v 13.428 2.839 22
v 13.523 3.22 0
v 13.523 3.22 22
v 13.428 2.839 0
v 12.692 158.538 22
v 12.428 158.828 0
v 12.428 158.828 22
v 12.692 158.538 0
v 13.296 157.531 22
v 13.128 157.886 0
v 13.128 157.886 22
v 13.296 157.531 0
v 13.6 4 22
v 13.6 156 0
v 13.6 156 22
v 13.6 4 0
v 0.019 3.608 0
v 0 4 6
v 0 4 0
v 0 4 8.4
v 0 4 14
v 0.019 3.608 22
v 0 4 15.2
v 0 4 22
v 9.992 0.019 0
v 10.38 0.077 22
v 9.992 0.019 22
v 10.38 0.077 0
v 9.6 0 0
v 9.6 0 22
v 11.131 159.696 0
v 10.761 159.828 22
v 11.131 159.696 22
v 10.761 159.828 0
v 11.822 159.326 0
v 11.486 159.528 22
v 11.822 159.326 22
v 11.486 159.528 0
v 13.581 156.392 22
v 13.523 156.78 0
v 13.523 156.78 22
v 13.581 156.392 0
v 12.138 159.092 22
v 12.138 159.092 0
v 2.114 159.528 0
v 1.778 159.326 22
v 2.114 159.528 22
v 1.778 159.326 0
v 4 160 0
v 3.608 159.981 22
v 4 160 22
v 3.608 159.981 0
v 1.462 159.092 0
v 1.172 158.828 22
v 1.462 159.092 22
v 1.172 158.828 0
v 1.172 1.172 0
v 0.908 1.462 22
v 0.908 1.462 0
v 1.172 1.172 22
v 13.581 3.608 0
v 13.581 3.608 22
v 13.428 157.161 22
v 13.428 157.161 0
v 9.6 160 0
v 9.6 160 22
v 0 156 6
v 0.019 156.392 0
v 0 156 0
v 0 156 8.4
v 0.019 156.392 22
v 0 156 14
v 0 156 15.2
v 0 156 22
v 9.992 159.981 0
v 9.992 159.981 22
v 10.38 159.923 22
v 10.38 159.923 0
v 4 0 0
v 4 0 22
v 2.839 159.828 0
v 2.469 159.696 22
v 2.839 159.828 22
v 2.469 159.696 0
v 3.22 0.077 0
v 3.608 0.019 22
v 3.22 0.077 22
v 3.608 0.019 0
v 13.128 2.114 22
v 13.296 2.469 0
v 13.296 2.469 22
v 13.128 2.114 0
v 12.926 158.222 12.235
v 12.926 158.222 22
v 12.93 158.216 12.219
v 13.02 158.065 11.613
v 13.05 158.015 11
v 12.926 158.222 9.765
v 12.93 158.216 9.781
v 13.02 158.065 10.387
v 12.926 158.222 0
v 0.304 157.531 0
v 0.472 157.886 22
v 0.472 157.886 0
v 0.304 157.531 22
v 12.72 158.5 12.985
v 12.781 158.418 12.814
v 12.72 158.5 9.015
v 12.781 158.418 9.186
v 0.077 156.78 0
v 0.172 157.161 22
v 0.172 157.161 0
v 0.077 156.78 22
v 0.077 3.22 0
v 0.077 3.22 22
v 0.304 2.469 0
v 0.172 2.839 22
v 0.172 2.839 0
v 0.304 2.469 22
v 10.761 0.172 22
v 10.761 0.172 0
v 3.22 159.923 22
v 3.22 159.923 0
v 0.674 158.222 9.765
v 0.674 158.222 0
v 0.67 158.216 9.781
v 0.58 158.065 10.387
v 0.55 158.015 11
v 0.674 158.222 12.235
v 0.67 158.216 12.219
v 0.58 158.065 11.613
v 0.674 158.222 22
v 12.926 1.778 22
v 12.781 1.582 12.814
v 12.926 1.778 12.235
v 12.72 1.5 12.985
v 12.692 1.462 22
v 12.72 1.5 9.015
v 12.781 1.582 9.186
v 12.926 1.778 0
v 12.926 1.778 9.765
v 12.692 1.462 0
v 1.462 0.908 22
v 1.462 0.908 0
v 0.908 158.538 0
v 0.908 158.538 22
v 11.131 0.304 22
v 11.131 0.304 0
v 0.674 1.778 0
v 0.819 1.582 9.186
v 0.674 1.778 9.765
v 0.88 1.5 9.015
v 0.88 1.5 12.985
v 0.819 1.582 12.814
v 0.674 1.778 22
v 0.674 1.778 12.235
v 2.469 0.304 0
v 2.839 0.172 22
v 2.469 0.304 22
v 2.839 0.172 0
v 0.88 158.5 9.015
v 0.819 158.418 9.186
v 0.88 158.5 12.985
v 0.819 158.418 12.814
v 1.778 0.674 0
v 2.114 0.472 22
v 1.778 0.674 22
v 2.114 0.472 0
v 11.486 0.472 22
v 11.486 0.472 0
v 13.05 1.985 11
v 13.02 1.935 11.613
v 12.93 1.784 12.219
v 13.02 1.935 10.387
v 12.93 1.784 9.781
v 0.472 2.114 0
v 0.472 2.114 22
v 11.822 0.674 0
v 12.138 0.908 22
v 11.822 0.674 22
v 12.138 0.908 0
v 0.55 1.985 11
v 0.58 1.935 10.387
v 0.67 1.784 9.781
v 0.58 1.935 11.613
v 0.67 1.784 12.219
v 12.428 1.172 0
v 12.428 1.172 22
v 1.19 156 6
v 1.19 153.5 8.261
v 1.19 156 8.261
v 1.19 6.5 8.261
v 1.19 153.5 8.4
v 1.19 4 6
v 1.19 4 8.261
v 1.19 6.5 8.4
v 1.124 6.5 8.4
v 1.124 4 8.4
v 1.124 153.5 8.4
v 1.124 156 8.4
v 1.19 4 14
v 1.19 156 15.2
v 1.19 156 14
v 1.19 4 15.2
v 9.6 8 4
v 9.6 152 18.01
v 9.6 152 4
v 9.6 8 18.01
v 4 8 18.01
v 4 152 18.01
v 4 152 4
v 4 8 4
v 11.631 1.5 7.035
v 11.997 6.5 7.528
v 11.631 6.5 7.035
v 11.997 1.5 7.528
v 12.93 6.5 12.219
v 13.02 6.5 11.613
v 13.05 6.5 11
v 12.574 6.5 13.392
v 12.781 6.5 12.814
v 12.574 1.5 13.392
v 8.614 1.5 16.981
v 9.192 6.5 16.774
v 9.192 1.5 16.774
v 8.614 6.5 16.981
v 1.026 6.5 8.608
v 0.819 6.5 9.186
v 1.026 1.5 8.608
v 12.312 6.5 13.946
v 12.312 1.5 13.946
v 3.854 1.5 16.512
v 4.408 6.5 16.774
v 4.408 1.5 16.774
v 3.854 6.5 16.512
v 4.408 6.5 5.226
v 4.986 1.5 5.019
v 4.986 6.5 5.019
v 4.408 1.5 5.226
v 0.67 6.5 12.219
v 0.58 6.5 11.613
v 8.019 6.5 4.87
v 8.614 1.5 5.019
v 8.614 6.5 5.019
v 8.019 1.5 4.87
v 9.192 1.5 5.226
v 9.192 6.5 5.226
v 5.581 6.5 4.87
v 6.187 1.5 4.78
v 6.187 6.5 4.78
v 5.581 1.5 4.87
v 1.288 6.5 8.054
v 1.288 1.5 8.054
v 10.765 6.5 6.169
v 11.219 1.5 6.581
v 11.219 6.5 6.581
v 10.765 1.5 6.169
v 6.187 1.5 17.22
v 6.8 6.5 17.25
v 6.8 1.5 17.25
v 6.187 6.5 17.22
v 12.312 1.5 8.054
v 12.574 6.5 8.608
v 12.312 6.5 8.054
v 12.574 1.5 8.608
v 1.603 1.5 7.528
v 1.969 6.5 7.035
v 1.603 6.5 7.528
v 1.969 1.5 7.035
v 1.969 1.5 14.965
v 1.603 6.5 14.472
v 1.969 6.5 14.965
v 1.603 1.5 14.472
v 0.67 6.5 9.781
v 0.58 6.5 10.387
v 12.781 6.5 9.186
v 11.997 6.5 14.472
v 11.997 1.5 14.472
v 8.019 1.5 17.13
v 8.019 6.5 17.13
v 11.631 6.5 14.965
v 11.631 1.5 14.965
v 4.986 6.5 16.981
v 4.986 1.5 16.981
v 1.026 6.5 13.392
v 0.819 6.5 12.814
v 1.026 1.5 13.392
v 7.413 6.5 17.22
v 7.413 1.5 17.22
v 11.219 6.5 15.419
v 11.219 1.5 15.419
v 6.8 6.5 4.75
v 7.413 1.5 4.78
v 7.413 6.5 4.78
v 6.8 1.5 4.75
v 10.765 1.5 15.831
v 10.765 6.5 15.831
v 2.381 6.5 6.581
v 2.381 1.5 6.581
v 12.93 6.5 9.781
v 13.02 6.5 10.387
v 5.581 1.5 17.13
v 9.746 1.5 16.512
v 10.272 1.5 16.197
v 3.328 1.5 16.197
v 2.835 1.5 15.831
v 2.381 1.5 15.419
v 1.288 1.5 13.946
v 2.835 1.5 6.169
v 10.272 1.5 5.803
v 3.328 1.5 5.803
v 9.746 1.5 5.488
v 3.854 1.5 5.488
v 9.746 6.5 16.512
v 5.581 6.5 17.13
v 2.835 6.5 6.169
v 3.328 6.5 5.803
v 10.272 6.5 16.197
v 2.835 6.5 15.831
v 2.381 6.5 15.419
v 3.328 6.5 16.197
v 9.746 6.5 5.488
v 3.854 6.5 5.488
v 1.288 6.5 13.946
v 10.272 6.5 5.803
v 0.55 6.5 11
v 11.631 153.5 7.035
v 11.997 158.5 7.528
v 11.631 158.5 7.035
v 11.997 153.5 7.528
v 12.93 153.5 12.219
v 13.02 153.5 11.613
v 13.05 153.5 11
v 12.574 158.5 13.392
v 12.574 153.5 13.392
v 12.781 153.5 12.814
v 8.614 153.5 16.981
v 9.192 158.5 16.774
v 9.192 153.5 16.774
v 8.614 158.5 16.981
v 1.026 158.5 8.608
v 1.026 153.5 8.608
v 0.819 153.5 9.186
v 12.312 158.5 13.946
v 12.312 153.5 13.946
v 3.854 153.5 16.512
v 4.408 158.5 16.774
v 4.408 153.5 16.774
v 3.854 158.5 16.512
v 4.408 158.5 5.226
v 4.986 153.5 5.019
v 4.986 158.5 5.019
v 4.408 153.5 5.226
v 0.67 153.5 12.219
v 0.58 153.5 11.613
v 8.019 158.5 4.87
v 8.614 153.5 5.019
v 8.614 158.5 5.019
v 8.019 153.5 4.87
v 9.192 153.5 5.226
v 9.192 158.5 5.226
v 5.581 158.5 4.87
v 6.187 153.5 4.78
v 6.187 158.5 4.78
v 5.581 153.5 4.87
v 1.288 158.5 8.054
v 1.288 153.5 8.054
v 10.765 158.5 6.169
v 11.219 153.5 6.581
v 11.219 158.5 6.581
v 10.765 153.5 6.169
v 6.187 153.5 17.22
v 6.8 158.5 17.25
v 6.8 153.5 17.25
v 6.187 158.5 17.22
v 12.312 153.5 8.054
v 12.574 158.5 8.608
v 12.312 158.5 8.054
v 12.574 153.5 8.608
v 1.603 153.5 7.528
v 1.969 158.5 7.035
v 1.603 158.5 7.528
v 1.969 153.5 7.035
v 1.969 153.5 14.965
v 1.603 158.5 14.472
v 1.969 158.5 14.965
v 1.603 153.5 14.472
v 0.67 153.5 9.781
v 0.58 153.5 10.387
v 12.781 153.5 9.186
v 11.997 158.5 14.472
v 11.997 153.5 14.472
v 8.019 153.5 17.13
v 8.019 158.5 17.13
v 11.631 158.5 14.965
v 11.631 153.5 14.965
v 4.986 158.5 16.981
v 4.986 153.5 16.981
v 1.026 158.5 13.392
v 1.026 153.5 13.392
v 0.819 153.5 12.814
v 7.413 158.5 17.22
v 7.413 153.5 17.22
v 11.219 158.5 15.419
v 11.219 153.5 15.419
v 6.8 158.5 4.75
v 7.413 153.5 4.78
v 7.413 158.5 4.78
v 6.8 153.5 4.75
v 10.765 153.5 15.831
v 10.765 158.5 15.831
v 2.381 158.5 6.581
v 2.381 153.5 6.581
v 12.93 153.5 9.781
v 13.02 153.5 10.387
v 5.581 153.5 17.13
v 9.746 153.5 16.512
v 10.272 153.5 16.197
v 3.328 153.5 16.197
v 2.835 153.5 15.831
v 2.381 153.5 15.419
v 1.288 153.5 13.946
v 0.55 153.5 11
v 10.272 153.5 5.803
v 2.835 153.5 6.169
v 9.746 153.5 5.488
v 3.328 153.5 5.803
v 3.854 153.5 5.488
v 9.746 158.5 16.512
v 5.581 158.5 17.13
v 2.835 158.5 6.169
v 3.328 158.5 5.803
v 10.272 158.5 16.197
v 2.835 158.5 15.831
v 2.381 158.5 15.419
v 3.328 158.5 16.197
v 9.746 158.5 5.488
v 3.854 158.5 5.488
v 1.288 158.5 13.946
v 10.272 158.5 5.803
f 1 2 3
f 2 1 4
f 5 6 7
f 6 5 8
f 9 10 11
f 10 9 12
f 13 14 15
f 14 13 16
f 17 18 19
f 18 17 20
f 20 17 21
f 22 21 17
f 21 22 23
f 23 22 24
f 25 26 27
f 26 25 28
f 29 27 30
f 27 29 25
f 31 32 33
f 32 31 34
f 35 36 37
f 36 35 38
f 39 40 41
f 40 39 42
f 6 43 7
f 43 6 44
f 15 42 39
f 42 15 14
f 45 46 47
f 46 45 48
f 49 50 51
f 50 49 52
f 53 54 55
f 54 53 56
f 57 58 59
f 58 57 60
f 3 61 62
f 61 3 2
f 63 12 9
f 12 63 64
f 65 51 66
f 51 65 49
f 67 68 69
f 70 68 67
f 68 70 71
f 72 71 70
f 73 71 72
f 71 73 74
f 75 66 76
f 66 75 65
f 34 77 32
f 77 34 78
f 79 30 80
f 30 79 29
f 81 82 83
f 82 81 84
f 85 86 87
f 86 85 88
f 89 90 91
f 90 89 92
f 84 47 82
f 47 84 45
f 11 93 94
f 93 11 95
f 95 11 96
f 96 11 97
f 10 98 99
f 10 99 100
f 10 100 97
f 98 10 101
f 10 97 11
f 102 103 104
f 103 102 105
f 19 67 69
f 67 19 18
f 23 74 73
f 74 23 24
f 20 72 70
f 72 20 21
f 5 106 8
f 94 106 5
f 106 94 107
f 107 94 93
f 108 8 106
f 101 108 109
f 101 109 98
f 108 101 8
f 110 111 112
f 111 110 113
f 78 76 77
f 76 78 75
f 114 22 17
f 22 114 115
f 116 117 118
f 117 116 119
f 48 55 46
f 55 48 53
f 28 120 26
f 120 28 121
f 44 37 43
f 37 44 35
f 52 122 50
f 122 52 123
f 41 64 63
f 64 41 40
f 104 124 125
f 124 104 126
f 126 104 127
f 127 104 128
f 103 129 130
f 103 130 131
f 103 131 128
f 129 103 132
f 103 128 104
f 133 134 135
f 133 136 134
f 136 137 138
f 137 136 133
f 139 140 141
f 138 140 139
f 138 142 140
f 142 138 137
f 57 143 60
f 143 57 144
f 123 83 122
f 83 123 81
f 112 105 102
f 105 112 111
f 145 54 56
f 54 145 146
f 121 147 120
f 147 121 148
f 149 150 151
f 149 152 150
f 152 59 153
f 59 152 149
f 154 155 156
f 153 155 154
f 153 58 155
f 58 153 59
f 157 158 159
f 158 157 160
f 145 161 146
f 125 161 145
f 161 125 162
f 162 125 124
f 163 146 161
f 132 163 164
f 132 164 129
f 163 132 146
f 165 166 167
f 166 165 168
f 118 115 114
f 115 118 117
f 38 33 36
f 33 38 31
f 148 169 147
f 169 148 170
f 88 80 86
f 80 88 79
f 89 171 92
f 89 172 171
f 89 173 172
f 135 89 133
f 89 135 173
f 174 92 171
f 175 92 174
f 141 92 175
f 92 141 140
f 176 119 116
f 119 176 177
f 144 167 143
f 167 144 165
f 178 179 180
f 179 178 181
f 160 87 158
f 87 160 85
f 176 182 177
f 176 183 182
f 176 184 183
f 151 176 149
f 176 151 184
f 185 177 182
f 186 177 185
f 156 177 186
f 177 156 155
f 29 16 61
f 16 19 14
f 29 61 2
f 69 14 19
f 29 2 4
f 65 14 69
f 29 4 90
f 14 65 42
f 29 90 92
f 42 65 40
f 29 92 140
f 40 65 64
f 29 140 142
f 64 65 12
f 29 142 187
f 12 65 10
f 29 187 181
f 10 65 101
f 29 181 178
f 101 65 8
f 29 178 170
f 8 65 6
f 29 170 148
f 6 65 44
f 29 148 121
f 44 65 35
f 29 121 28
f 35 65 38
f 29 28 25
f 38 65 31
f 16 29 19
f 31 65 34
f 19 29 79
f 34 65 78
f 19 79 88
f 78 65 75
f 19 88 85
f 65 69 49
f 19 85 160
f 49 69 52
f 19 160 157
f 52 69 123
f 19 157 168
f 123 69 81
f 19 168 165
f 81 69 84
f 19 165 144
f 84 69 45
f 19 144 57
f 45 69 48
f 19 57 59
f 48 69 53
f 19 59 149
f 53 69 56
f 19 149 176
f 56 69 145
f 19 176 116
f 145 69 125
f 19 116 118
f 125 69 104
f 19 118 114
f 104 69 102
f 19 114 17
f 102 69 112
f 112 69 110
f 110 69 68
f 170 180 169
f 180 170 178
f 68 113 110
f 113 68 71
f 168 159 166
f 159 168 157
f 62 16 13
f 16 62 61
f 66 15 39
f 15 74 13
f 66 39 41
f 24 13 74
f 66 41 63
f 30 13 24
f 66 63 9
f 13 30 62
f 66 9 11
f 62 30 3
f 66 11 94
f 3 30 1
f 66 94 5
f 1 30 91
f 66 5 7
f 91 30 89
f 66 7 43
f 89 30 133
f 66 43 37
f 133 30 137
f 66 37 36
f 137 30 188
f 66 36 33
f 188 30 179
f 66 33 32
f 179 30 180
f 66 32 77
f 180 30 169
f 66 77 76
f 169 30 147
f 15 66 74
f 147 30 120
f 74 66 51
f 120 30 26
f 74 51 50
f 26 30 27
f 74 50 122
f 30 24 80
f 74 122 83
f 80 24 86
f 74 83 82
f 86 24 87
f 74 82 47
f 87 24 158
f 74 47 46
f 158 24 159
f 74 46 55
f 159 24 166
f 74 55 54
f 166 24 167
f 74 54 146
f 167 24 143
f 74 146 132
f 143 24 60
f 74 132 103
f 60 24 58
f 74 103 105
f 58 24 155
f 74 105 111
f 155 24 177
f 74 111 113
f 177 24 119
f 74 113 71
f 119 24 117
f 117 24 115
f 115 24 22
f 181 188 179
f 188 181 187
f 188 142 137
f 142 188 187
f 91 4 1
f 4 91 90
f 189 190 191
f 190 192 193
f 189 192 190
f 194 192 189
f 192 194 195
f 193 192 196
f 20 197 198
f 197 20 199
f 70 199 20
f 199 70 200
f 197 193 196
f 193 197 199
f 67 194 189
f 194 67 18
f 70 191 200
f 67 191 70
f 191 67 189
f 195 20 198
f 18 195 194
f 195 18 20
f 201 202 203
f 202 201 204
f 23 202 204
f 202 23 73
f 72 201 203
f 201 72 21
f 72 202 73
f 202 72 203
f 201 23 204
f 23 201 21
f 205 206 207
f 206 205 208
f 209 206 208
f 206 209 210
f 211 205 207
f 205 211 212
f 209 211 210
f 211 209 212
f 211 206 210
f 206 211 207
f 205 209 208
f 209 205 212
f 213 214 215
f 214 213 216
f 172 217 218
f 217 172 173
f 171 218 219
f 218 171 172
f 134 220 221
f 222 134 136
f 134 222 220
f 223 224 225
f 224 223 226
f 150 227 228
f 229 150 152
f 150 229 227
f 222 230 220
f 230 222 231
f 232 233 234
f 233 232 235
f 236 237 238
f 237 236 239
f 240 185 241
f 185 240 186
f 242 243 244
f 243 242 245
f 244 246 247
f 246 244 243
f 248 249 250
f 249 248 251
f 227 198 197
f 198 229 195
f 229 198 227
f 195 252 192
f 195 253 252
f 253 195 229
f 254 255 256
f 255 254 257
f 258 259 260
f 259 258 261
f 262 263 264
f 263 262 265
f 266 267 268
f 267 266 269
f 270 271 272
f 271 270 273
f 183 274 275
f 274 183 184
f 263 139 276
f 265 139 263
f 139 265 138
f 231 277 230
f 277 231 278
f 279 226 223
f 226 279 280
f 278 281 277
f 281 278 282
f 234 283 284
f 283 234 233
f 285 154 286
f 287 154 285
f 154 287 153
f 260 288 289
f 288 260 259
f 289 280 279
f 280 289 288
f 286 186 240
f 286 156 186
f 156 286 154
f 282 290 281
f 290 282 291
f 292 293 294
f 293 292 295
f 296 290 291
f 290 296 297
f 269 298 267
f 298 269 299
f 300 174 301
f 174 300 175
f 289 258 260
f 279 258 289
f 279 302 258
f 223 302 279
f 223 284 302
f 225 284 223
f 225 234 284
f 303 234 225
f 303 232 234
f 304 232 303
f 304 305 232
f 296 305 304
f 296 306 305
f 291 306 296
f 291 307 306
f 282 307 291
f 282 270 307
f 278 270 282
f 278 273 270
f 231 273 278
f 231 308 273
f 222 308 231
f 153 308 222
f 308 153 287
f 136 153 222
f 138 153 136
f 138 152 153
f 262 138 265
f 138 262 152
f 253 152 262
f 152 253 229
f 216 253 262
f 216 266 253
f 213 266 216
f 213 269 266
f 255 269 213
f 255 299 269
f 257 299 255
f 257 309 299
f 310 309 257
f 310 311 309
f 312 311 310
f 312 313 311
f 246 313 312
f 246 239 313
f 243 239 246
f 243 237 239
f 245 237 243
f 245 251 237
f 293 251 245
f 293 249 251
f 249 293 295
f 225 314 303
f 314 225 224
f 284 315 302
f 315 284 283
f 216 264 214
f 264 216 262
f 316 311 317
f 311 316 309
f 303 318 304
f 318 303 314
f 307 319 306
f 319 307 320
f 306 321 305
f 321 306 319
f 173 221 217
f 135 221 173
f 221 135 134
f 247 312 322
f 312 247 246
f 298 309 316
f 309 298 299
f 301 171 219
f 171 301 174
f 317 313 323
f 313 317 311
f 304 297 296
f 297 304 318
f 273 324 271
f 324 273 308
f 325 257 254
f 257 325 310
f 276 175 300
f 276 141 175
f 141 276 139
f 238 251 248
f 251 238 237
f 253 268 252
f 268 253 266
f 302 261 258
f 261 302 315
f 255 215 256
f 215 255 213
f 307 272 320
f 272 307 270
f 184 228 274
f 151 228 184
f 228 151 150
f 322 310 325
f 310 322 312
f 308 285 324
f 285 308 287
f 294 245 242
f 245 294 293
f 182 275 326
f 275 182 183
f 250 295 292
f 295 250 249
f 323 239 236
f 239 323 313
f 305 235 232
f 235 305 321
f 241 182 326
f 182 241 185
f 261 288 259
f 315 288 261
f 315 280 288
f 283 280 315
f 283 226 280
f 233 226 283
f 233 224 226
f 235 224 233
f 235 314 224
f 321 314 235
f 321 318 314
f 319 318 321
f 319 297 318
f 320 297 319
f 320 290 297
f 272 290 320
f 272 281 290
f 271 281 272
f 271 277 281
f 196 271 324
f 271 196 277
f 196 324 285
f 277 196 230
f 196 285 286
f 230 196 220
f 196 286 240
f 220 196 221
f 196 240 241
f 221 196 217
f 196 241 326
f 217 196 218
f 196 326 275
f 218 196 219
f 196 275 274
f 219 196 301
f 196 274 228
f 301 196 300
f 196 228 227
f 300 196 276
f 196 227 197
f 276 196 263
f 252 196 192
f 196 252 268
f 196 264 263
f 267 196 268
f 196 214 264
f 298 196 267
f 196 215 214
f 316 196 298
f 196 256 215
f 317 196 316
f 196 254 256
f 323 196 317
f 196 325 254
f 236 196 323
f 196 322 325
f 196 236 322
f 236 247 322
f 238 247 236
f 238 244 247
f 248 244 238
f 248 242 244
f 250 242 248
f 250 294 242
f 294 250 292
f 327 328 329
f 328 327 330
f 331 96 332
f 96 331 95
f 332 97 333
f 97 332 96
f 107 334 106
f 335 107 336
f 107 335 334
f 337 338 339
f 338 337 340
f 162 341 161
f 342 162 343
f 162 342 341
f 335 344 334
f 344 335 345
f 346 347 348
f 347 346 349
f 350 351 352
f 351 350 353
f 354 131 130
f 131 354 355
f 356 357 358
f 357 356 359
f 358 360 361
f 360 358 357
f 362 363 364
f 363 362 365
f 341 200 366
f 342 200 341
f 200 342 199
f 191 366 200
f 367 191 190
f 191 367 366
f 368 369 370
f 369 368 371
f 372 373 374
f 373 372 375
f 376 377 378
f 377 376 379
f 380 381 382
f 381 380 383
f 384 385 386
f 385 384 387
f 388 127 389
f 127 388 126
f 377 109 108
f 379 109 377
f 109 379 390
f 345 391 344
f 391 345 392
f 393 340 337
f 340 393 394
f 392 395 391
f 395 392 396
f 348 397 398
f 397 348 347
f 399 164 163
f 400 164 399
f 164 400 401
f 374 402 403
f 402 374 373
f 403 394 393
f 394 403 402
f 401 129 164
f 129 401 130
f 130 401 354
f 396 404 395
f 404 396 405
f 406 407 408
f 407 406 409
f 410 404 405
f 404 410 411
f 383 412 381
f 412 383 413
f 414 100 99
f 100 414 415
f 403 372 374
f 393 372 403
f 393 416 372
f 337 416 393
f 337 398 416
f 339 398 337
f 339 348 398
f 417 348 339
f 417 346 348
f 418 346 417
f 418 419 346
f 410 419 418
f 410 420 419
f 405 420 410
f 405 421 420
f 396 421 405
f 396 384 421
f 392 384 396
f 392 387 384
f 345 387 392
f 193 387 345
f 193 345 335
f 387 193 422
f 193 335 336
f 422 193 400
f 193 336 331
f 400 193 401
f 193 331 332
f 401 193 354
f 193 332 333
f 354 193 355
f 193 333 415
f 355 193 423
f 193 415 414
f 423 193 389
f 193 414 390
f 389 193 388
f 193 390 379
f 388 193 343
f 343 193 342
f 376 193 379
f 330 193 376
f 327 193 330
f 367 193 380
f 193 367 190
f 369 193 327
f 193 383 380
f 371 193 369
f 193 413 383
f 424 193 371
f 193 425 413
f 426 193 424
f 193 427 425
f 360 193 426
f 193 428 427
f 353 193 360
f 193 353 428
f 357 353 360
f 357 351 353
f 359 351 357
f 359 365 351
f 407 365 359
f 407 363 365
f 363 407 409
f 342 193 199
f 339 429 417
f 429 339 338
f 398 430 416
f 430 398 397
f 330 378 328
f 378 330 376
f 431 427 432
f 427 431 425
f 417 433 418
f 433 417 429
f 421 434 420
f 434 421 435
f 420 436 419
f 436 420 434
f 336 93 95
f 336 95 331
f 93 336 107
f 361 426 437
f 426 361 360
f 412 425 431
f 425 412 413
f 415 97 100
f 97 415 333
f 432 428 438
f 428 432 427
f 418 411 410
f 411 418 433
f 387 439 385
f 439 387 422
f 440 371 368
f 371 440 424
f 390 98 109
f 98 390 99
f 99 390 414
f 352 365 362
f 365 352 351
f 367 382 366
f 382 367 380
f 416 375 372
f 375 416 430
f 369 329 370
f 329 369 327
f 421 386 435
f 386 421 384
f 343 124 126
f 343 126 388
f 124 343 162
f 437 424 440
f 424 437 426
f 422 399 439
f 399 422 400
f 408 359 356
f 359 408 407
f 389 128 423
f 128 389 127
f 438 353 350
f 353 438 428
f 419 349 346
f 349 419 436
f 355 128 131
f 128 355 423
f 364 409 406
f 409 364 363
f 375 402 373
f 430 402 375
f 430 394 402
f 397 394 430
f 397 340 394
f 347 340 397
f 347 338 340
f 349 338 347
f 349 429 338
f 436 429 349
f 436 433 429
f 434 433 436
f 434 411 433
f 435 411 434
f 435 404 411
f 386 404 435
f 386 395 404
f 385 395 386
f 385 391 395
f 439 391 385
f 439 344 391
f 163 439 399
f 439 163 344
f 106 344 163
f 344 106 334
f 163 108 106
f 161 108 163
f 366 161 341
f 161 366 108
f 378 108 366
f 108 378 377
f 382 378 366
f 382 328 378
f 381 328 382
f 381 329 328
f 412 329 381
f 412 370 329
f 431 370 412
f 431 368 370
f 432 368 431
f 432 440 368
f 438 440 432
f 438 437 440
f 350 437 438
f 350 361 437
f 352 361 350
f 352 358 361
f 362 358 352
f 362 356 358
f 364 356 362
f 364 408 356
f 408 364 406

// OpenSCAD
// file: chopperchair_params.scad
// ChopperChair — Shared Parameters
// Injected by pipeline/bridge.py from measurements.json
// License: CC-BY-SA 4.0

// ── Dog measurements (mm) ─────────────────────────────────────────────────
torso_length     = 160;  // shoulder to hip
hip_width        = 90;   // widest point across hips
shoulder_width   = 80;   // front saddle width
rear_leg_length  = 80;   // floor to hip joint
ground_clearance = 45;   // chassis floor height
girth            = 165;  // belly circumference (harness ref)

// ── Hardware (mm) ─────────────────────────────────────────────────────────
wheel_diameter   = 100;  // purchased wheel OD
axle_diameter    = 8;    // purchased axle rod OD (Build 2: 8mm steel)
hub_motor_od     = 80;   // T-Motor MN1005 stator OD (Build 4 only)
hub_motor_depth  = 28;   // motor depth (Build 4 only)

// ── Frame geometry (mm) ───────────────────────────────────────────────────
wall_thickness   = 4;
rail_w           = 16;
rail_h           = 20;
crossbar_od      = 12;
spring_boss_od   = 18;
stopper_w        = 22;
stopper_h        = 15;

// ── SitGo pivot ───────────────────────────────────────────────────────────
collapse_angle   = 45;   // degrees — full lie-down
sit_angle        = 25;   // degrees — sit position
pivot_arm_t      = wall_thickness * 2.5;  // arm thickness

// ── Tolerances ────────────────────────────────────────────────────────────
clear_close      = 0.15; // press-fit clearance
clear_slide      = 0.25; // sliding fit clearance
clear_free       = 0.4;  // free-running clearance

$fn = 64;
// main file
// ChopperChair — Build 3: Slick
// Topology-optimized aesthetic redesign. Drop-in hardware upgrade from Build 2.
// Inspired by Ascento / Diablo open-leg platforms.
// License: CC-BY-SA 4.0

include <chopperchair_params.scad>;

// ── Utilities ─────────────────────────────────────────────────────────────
module rounded_rect(w, h, d, r=3) {
    hull() {
        translate([ r, r, 0]) cylinder(r=r, h=d);
        translate([w-r, r, 0]) cylinder(r=r, h=d);
        translate([ r, h-r, 0]) cylinder(r=r, h=d);
        translate([w-r, h-r, 0]) cylinder(r=r, h=d);
    }
}

// ── Strut cutout pattern (FEA-inspired topology reduction) ────────────────
// Elongated diamond voids arranged along the load path of the arm.
module strut_void(l, w) {
    // Diamond cutout — strong along long axis, material removed laterally
    hull() {
        translate([0,  l/2, 0]) cylinder(r=w*0.25, h=100, center=true);
        translate([0, -l/2, 0]) cylinder(r=w*0.25, h=100, center=true);
        translate([ w*0.4, 0, 0]) cylinder(r=0.5, h=100, center=true);
        translate([-w*0.4, 0, 0]) cylinder(r=0.5, h=100, center=true);
    }
}

// ── Slick Rail (panel-gap channels, exposed structure aesthetic) ───────────
module slick_rail() {
    t = pivot_arm_t;
    difference() {
        // Outer profile — taller and thinner than Build 2
        rounded_rect(rail_w * 0.85, torso_length, rail_h * 1.1, r=4);

        // Panel-gap channel — 1mm groove running full length on outer face
        translate([-0.01, wall_thickness, rail_h * 0.3])
            cube([1.2, torso_length - wall_thickness*2, rail_h * 0.12]);
        translate([-0.01, wall_thickness, rail_h * 0.7])
            cube([1.2, torso_length - wall_thickness*2, rail_h * 0.06]);

        // Lightening pocket
        translate([wall_thickness, wall_thickness*2, wall_thickness])
            cube([rail_w*0.85 - wall_thickness*2,
                  torso_length - wall_thickness*4,
                  rail_h*1.1 - wall_thickness*2 + 0.01]);

        // Crossbar sockets
        translate([rail_w*0.425, wall_thickness, rail_h*0.55])
            rotate([90,0,0]) cylinder(d=crossbar_od + clear_slide*2, h=wall_thickness+1, center=true);
        translate([rail_w*0.425, torso_length - wall_thickness, rail_h*0.55])
            rotate([90,0,0]) cylinder(d=crossbar_od + clear_slide*2, h=wall_thickness+1, center=true);
    }
}

// ── Slick Pivot Arm (strut-frame topology) ────────────────────────────────
module slick_pivot_arm() {
    arm_w   = rail_w * 0.9;
    tab_w   = rail_w * 1.8;
    tab_h   = rail_h;
    axle_z  = wheel_diameter/2 + 5;
    t       = pivot_arm_t * 1.1; // slightly thicker for rigidity

    difference() {
        union() {
            // Vertical section
            rounded_rect(arm_w, rear_leg_length, t, r=4);
            // Tab
            translate([arm_w, rear_leg_length - tab_h, 0])
                rounded_rect(tab_w, tab_h, t, r=4);
            // Spring boss
            translate([arm_w + tab_w/2, rear_leg_length - tab_h/2, t])
                cylinder(d=spring_boss_od, h=10);
            // Exposed spring coil boss ring (aesthetic detail)
            translate([arm_w + tab_w/2, rear_leg_length - tab_h/2, t + 10])
                difference() {
                    cylinder(d=spring_boss_od + 3, h=2);
                    cylinder(d=spring_boss_od - 1, h=3);
                }
        }

        // FEA-inspired strut voids — 3 along vertical section
        for (i=[0.25, 0.5, 0.68]) {
            translate([arm_w/2, rear_leg_length * i, t/2])
                strut_void(rear_leg_length * 0.15, arm_w * 0.55);
        }

        // Pivot bore
        translate([arm_w/2, rear_leg_length - tab_h/2, -1])
            cylinder(d=axle_diameter + clear_close*2, h=t+2);
        // Wheel axle bore
        translate([arm_w/2, axle_z, -1])
            cylinder(d=axle_diameter + clear_close*2, h=t+2);
        // Spring boss bolt
        translate([arm_w + tab_w/2, rear_leg_length - tab_h/2, -1])
            cylinder(d=4.5, h=spring_boss_od + 16);
    }
}

// ── Slick Stopper (chamfered, tighter geometry) ───────────────────────────
module slick_stopper() {
    difference() {
        hull() {
            cube([stopper_w, stopper_h * 0.8, pivot_arm_t]);
            translate([stopper_w*0.1, stopper_h*0.8, 0])
                cube([stopper_w*0.8, stopper_h*0.2, pivot_arm_t]);
        }
        translate([stopper_w*0.25, stopper_h/2, -1]) cylinder(d=4.5, h=pivot_arm_t+2);
        translate([stopper_w*0.75, stopper_h/2, -1]) cylinder(d=4.5, h=pivot_arm_t+2);
    }
}

// ── Part selector ─────────────────────────────────────────────────────────
part = "rail_left";
// rail_left | rail_right | crossbar_front | crossbar_rear
// pivot_arm_left | pivot_arm_right | spring_boss_left | spring_boss_right
// axle_cap_left | axle_cap_right | stopper_left | stopper_right | belly_sling_mount

module axle_cap() {
    difference() {
        cylinder(d=axle_diameter + 8, h=14);
        translate([0,0,-0.01]) cylinder(d=axle_diameter - clear_close*2, h=10);
        translate([axle_diameter/2 + 2, 0, 7]) rotate([0,90,0]) cylinder(d=3.3, h=8);
    }
}

module spring_boss() {
    difference() {
        cylinder(d=spring_boss_od - clear_close*2, h=12);
        translate([0,0,4]) cylinder(d=spring_boss_od*0.5, h=9);
        translate([0,0,-0.01]) cylinder(d=4.5, h=13);
    }
}

module belly_sling_mount() {
    slot_w = 12; slot_h = 4;
    difference() {
        rounded_rect(hip_width * 0.4, 30, 8, r=3);
        translate([8, 10, wall_thickness]) cube([slot_w, slot_h, 8 - wall_thickness + 1]);
        translate([hip_width*0.4 - 8 - slot_w, 10, wall_thickness]) cube([slot_w, slot_h, 8 - wall_thickness + 1]);
        translate([hip_width*0.4/2, 25, -1]) cylinder(d=4.5, h=10);
    }
}

if (part == "rail_left")          slick_rail();
if (part == "rail_right")         mirror([1,0,0]) slick_rail();
if (part == "crossbar_front")     cylinder(d=crossbar_od, h=hip_width + rail_w*2);
if (part == "crossbar_rear")      cylinder(d=crossbar_od, h=hip_width + rail_w*2);
if (part == "pivot_arm_left")     slick_pivot_arm();
if (part == "pivot_arm_right")    mirror([1,0,0]) slick_pivot_arm();
if (part == "spring_boss_left")   spring_boss();
if (part == "spring_boss_right")  spring_boss();
if (part == "axle_cap_left")      axle_cap();
if (part == "axle_cap_right")     axle_cap();
if (part == "stopper_left")       slick_stopper();
if (part == "stopper_right")      slick_stopper();
if (part == "belly_sling_mount")  belly_sling_mount();
